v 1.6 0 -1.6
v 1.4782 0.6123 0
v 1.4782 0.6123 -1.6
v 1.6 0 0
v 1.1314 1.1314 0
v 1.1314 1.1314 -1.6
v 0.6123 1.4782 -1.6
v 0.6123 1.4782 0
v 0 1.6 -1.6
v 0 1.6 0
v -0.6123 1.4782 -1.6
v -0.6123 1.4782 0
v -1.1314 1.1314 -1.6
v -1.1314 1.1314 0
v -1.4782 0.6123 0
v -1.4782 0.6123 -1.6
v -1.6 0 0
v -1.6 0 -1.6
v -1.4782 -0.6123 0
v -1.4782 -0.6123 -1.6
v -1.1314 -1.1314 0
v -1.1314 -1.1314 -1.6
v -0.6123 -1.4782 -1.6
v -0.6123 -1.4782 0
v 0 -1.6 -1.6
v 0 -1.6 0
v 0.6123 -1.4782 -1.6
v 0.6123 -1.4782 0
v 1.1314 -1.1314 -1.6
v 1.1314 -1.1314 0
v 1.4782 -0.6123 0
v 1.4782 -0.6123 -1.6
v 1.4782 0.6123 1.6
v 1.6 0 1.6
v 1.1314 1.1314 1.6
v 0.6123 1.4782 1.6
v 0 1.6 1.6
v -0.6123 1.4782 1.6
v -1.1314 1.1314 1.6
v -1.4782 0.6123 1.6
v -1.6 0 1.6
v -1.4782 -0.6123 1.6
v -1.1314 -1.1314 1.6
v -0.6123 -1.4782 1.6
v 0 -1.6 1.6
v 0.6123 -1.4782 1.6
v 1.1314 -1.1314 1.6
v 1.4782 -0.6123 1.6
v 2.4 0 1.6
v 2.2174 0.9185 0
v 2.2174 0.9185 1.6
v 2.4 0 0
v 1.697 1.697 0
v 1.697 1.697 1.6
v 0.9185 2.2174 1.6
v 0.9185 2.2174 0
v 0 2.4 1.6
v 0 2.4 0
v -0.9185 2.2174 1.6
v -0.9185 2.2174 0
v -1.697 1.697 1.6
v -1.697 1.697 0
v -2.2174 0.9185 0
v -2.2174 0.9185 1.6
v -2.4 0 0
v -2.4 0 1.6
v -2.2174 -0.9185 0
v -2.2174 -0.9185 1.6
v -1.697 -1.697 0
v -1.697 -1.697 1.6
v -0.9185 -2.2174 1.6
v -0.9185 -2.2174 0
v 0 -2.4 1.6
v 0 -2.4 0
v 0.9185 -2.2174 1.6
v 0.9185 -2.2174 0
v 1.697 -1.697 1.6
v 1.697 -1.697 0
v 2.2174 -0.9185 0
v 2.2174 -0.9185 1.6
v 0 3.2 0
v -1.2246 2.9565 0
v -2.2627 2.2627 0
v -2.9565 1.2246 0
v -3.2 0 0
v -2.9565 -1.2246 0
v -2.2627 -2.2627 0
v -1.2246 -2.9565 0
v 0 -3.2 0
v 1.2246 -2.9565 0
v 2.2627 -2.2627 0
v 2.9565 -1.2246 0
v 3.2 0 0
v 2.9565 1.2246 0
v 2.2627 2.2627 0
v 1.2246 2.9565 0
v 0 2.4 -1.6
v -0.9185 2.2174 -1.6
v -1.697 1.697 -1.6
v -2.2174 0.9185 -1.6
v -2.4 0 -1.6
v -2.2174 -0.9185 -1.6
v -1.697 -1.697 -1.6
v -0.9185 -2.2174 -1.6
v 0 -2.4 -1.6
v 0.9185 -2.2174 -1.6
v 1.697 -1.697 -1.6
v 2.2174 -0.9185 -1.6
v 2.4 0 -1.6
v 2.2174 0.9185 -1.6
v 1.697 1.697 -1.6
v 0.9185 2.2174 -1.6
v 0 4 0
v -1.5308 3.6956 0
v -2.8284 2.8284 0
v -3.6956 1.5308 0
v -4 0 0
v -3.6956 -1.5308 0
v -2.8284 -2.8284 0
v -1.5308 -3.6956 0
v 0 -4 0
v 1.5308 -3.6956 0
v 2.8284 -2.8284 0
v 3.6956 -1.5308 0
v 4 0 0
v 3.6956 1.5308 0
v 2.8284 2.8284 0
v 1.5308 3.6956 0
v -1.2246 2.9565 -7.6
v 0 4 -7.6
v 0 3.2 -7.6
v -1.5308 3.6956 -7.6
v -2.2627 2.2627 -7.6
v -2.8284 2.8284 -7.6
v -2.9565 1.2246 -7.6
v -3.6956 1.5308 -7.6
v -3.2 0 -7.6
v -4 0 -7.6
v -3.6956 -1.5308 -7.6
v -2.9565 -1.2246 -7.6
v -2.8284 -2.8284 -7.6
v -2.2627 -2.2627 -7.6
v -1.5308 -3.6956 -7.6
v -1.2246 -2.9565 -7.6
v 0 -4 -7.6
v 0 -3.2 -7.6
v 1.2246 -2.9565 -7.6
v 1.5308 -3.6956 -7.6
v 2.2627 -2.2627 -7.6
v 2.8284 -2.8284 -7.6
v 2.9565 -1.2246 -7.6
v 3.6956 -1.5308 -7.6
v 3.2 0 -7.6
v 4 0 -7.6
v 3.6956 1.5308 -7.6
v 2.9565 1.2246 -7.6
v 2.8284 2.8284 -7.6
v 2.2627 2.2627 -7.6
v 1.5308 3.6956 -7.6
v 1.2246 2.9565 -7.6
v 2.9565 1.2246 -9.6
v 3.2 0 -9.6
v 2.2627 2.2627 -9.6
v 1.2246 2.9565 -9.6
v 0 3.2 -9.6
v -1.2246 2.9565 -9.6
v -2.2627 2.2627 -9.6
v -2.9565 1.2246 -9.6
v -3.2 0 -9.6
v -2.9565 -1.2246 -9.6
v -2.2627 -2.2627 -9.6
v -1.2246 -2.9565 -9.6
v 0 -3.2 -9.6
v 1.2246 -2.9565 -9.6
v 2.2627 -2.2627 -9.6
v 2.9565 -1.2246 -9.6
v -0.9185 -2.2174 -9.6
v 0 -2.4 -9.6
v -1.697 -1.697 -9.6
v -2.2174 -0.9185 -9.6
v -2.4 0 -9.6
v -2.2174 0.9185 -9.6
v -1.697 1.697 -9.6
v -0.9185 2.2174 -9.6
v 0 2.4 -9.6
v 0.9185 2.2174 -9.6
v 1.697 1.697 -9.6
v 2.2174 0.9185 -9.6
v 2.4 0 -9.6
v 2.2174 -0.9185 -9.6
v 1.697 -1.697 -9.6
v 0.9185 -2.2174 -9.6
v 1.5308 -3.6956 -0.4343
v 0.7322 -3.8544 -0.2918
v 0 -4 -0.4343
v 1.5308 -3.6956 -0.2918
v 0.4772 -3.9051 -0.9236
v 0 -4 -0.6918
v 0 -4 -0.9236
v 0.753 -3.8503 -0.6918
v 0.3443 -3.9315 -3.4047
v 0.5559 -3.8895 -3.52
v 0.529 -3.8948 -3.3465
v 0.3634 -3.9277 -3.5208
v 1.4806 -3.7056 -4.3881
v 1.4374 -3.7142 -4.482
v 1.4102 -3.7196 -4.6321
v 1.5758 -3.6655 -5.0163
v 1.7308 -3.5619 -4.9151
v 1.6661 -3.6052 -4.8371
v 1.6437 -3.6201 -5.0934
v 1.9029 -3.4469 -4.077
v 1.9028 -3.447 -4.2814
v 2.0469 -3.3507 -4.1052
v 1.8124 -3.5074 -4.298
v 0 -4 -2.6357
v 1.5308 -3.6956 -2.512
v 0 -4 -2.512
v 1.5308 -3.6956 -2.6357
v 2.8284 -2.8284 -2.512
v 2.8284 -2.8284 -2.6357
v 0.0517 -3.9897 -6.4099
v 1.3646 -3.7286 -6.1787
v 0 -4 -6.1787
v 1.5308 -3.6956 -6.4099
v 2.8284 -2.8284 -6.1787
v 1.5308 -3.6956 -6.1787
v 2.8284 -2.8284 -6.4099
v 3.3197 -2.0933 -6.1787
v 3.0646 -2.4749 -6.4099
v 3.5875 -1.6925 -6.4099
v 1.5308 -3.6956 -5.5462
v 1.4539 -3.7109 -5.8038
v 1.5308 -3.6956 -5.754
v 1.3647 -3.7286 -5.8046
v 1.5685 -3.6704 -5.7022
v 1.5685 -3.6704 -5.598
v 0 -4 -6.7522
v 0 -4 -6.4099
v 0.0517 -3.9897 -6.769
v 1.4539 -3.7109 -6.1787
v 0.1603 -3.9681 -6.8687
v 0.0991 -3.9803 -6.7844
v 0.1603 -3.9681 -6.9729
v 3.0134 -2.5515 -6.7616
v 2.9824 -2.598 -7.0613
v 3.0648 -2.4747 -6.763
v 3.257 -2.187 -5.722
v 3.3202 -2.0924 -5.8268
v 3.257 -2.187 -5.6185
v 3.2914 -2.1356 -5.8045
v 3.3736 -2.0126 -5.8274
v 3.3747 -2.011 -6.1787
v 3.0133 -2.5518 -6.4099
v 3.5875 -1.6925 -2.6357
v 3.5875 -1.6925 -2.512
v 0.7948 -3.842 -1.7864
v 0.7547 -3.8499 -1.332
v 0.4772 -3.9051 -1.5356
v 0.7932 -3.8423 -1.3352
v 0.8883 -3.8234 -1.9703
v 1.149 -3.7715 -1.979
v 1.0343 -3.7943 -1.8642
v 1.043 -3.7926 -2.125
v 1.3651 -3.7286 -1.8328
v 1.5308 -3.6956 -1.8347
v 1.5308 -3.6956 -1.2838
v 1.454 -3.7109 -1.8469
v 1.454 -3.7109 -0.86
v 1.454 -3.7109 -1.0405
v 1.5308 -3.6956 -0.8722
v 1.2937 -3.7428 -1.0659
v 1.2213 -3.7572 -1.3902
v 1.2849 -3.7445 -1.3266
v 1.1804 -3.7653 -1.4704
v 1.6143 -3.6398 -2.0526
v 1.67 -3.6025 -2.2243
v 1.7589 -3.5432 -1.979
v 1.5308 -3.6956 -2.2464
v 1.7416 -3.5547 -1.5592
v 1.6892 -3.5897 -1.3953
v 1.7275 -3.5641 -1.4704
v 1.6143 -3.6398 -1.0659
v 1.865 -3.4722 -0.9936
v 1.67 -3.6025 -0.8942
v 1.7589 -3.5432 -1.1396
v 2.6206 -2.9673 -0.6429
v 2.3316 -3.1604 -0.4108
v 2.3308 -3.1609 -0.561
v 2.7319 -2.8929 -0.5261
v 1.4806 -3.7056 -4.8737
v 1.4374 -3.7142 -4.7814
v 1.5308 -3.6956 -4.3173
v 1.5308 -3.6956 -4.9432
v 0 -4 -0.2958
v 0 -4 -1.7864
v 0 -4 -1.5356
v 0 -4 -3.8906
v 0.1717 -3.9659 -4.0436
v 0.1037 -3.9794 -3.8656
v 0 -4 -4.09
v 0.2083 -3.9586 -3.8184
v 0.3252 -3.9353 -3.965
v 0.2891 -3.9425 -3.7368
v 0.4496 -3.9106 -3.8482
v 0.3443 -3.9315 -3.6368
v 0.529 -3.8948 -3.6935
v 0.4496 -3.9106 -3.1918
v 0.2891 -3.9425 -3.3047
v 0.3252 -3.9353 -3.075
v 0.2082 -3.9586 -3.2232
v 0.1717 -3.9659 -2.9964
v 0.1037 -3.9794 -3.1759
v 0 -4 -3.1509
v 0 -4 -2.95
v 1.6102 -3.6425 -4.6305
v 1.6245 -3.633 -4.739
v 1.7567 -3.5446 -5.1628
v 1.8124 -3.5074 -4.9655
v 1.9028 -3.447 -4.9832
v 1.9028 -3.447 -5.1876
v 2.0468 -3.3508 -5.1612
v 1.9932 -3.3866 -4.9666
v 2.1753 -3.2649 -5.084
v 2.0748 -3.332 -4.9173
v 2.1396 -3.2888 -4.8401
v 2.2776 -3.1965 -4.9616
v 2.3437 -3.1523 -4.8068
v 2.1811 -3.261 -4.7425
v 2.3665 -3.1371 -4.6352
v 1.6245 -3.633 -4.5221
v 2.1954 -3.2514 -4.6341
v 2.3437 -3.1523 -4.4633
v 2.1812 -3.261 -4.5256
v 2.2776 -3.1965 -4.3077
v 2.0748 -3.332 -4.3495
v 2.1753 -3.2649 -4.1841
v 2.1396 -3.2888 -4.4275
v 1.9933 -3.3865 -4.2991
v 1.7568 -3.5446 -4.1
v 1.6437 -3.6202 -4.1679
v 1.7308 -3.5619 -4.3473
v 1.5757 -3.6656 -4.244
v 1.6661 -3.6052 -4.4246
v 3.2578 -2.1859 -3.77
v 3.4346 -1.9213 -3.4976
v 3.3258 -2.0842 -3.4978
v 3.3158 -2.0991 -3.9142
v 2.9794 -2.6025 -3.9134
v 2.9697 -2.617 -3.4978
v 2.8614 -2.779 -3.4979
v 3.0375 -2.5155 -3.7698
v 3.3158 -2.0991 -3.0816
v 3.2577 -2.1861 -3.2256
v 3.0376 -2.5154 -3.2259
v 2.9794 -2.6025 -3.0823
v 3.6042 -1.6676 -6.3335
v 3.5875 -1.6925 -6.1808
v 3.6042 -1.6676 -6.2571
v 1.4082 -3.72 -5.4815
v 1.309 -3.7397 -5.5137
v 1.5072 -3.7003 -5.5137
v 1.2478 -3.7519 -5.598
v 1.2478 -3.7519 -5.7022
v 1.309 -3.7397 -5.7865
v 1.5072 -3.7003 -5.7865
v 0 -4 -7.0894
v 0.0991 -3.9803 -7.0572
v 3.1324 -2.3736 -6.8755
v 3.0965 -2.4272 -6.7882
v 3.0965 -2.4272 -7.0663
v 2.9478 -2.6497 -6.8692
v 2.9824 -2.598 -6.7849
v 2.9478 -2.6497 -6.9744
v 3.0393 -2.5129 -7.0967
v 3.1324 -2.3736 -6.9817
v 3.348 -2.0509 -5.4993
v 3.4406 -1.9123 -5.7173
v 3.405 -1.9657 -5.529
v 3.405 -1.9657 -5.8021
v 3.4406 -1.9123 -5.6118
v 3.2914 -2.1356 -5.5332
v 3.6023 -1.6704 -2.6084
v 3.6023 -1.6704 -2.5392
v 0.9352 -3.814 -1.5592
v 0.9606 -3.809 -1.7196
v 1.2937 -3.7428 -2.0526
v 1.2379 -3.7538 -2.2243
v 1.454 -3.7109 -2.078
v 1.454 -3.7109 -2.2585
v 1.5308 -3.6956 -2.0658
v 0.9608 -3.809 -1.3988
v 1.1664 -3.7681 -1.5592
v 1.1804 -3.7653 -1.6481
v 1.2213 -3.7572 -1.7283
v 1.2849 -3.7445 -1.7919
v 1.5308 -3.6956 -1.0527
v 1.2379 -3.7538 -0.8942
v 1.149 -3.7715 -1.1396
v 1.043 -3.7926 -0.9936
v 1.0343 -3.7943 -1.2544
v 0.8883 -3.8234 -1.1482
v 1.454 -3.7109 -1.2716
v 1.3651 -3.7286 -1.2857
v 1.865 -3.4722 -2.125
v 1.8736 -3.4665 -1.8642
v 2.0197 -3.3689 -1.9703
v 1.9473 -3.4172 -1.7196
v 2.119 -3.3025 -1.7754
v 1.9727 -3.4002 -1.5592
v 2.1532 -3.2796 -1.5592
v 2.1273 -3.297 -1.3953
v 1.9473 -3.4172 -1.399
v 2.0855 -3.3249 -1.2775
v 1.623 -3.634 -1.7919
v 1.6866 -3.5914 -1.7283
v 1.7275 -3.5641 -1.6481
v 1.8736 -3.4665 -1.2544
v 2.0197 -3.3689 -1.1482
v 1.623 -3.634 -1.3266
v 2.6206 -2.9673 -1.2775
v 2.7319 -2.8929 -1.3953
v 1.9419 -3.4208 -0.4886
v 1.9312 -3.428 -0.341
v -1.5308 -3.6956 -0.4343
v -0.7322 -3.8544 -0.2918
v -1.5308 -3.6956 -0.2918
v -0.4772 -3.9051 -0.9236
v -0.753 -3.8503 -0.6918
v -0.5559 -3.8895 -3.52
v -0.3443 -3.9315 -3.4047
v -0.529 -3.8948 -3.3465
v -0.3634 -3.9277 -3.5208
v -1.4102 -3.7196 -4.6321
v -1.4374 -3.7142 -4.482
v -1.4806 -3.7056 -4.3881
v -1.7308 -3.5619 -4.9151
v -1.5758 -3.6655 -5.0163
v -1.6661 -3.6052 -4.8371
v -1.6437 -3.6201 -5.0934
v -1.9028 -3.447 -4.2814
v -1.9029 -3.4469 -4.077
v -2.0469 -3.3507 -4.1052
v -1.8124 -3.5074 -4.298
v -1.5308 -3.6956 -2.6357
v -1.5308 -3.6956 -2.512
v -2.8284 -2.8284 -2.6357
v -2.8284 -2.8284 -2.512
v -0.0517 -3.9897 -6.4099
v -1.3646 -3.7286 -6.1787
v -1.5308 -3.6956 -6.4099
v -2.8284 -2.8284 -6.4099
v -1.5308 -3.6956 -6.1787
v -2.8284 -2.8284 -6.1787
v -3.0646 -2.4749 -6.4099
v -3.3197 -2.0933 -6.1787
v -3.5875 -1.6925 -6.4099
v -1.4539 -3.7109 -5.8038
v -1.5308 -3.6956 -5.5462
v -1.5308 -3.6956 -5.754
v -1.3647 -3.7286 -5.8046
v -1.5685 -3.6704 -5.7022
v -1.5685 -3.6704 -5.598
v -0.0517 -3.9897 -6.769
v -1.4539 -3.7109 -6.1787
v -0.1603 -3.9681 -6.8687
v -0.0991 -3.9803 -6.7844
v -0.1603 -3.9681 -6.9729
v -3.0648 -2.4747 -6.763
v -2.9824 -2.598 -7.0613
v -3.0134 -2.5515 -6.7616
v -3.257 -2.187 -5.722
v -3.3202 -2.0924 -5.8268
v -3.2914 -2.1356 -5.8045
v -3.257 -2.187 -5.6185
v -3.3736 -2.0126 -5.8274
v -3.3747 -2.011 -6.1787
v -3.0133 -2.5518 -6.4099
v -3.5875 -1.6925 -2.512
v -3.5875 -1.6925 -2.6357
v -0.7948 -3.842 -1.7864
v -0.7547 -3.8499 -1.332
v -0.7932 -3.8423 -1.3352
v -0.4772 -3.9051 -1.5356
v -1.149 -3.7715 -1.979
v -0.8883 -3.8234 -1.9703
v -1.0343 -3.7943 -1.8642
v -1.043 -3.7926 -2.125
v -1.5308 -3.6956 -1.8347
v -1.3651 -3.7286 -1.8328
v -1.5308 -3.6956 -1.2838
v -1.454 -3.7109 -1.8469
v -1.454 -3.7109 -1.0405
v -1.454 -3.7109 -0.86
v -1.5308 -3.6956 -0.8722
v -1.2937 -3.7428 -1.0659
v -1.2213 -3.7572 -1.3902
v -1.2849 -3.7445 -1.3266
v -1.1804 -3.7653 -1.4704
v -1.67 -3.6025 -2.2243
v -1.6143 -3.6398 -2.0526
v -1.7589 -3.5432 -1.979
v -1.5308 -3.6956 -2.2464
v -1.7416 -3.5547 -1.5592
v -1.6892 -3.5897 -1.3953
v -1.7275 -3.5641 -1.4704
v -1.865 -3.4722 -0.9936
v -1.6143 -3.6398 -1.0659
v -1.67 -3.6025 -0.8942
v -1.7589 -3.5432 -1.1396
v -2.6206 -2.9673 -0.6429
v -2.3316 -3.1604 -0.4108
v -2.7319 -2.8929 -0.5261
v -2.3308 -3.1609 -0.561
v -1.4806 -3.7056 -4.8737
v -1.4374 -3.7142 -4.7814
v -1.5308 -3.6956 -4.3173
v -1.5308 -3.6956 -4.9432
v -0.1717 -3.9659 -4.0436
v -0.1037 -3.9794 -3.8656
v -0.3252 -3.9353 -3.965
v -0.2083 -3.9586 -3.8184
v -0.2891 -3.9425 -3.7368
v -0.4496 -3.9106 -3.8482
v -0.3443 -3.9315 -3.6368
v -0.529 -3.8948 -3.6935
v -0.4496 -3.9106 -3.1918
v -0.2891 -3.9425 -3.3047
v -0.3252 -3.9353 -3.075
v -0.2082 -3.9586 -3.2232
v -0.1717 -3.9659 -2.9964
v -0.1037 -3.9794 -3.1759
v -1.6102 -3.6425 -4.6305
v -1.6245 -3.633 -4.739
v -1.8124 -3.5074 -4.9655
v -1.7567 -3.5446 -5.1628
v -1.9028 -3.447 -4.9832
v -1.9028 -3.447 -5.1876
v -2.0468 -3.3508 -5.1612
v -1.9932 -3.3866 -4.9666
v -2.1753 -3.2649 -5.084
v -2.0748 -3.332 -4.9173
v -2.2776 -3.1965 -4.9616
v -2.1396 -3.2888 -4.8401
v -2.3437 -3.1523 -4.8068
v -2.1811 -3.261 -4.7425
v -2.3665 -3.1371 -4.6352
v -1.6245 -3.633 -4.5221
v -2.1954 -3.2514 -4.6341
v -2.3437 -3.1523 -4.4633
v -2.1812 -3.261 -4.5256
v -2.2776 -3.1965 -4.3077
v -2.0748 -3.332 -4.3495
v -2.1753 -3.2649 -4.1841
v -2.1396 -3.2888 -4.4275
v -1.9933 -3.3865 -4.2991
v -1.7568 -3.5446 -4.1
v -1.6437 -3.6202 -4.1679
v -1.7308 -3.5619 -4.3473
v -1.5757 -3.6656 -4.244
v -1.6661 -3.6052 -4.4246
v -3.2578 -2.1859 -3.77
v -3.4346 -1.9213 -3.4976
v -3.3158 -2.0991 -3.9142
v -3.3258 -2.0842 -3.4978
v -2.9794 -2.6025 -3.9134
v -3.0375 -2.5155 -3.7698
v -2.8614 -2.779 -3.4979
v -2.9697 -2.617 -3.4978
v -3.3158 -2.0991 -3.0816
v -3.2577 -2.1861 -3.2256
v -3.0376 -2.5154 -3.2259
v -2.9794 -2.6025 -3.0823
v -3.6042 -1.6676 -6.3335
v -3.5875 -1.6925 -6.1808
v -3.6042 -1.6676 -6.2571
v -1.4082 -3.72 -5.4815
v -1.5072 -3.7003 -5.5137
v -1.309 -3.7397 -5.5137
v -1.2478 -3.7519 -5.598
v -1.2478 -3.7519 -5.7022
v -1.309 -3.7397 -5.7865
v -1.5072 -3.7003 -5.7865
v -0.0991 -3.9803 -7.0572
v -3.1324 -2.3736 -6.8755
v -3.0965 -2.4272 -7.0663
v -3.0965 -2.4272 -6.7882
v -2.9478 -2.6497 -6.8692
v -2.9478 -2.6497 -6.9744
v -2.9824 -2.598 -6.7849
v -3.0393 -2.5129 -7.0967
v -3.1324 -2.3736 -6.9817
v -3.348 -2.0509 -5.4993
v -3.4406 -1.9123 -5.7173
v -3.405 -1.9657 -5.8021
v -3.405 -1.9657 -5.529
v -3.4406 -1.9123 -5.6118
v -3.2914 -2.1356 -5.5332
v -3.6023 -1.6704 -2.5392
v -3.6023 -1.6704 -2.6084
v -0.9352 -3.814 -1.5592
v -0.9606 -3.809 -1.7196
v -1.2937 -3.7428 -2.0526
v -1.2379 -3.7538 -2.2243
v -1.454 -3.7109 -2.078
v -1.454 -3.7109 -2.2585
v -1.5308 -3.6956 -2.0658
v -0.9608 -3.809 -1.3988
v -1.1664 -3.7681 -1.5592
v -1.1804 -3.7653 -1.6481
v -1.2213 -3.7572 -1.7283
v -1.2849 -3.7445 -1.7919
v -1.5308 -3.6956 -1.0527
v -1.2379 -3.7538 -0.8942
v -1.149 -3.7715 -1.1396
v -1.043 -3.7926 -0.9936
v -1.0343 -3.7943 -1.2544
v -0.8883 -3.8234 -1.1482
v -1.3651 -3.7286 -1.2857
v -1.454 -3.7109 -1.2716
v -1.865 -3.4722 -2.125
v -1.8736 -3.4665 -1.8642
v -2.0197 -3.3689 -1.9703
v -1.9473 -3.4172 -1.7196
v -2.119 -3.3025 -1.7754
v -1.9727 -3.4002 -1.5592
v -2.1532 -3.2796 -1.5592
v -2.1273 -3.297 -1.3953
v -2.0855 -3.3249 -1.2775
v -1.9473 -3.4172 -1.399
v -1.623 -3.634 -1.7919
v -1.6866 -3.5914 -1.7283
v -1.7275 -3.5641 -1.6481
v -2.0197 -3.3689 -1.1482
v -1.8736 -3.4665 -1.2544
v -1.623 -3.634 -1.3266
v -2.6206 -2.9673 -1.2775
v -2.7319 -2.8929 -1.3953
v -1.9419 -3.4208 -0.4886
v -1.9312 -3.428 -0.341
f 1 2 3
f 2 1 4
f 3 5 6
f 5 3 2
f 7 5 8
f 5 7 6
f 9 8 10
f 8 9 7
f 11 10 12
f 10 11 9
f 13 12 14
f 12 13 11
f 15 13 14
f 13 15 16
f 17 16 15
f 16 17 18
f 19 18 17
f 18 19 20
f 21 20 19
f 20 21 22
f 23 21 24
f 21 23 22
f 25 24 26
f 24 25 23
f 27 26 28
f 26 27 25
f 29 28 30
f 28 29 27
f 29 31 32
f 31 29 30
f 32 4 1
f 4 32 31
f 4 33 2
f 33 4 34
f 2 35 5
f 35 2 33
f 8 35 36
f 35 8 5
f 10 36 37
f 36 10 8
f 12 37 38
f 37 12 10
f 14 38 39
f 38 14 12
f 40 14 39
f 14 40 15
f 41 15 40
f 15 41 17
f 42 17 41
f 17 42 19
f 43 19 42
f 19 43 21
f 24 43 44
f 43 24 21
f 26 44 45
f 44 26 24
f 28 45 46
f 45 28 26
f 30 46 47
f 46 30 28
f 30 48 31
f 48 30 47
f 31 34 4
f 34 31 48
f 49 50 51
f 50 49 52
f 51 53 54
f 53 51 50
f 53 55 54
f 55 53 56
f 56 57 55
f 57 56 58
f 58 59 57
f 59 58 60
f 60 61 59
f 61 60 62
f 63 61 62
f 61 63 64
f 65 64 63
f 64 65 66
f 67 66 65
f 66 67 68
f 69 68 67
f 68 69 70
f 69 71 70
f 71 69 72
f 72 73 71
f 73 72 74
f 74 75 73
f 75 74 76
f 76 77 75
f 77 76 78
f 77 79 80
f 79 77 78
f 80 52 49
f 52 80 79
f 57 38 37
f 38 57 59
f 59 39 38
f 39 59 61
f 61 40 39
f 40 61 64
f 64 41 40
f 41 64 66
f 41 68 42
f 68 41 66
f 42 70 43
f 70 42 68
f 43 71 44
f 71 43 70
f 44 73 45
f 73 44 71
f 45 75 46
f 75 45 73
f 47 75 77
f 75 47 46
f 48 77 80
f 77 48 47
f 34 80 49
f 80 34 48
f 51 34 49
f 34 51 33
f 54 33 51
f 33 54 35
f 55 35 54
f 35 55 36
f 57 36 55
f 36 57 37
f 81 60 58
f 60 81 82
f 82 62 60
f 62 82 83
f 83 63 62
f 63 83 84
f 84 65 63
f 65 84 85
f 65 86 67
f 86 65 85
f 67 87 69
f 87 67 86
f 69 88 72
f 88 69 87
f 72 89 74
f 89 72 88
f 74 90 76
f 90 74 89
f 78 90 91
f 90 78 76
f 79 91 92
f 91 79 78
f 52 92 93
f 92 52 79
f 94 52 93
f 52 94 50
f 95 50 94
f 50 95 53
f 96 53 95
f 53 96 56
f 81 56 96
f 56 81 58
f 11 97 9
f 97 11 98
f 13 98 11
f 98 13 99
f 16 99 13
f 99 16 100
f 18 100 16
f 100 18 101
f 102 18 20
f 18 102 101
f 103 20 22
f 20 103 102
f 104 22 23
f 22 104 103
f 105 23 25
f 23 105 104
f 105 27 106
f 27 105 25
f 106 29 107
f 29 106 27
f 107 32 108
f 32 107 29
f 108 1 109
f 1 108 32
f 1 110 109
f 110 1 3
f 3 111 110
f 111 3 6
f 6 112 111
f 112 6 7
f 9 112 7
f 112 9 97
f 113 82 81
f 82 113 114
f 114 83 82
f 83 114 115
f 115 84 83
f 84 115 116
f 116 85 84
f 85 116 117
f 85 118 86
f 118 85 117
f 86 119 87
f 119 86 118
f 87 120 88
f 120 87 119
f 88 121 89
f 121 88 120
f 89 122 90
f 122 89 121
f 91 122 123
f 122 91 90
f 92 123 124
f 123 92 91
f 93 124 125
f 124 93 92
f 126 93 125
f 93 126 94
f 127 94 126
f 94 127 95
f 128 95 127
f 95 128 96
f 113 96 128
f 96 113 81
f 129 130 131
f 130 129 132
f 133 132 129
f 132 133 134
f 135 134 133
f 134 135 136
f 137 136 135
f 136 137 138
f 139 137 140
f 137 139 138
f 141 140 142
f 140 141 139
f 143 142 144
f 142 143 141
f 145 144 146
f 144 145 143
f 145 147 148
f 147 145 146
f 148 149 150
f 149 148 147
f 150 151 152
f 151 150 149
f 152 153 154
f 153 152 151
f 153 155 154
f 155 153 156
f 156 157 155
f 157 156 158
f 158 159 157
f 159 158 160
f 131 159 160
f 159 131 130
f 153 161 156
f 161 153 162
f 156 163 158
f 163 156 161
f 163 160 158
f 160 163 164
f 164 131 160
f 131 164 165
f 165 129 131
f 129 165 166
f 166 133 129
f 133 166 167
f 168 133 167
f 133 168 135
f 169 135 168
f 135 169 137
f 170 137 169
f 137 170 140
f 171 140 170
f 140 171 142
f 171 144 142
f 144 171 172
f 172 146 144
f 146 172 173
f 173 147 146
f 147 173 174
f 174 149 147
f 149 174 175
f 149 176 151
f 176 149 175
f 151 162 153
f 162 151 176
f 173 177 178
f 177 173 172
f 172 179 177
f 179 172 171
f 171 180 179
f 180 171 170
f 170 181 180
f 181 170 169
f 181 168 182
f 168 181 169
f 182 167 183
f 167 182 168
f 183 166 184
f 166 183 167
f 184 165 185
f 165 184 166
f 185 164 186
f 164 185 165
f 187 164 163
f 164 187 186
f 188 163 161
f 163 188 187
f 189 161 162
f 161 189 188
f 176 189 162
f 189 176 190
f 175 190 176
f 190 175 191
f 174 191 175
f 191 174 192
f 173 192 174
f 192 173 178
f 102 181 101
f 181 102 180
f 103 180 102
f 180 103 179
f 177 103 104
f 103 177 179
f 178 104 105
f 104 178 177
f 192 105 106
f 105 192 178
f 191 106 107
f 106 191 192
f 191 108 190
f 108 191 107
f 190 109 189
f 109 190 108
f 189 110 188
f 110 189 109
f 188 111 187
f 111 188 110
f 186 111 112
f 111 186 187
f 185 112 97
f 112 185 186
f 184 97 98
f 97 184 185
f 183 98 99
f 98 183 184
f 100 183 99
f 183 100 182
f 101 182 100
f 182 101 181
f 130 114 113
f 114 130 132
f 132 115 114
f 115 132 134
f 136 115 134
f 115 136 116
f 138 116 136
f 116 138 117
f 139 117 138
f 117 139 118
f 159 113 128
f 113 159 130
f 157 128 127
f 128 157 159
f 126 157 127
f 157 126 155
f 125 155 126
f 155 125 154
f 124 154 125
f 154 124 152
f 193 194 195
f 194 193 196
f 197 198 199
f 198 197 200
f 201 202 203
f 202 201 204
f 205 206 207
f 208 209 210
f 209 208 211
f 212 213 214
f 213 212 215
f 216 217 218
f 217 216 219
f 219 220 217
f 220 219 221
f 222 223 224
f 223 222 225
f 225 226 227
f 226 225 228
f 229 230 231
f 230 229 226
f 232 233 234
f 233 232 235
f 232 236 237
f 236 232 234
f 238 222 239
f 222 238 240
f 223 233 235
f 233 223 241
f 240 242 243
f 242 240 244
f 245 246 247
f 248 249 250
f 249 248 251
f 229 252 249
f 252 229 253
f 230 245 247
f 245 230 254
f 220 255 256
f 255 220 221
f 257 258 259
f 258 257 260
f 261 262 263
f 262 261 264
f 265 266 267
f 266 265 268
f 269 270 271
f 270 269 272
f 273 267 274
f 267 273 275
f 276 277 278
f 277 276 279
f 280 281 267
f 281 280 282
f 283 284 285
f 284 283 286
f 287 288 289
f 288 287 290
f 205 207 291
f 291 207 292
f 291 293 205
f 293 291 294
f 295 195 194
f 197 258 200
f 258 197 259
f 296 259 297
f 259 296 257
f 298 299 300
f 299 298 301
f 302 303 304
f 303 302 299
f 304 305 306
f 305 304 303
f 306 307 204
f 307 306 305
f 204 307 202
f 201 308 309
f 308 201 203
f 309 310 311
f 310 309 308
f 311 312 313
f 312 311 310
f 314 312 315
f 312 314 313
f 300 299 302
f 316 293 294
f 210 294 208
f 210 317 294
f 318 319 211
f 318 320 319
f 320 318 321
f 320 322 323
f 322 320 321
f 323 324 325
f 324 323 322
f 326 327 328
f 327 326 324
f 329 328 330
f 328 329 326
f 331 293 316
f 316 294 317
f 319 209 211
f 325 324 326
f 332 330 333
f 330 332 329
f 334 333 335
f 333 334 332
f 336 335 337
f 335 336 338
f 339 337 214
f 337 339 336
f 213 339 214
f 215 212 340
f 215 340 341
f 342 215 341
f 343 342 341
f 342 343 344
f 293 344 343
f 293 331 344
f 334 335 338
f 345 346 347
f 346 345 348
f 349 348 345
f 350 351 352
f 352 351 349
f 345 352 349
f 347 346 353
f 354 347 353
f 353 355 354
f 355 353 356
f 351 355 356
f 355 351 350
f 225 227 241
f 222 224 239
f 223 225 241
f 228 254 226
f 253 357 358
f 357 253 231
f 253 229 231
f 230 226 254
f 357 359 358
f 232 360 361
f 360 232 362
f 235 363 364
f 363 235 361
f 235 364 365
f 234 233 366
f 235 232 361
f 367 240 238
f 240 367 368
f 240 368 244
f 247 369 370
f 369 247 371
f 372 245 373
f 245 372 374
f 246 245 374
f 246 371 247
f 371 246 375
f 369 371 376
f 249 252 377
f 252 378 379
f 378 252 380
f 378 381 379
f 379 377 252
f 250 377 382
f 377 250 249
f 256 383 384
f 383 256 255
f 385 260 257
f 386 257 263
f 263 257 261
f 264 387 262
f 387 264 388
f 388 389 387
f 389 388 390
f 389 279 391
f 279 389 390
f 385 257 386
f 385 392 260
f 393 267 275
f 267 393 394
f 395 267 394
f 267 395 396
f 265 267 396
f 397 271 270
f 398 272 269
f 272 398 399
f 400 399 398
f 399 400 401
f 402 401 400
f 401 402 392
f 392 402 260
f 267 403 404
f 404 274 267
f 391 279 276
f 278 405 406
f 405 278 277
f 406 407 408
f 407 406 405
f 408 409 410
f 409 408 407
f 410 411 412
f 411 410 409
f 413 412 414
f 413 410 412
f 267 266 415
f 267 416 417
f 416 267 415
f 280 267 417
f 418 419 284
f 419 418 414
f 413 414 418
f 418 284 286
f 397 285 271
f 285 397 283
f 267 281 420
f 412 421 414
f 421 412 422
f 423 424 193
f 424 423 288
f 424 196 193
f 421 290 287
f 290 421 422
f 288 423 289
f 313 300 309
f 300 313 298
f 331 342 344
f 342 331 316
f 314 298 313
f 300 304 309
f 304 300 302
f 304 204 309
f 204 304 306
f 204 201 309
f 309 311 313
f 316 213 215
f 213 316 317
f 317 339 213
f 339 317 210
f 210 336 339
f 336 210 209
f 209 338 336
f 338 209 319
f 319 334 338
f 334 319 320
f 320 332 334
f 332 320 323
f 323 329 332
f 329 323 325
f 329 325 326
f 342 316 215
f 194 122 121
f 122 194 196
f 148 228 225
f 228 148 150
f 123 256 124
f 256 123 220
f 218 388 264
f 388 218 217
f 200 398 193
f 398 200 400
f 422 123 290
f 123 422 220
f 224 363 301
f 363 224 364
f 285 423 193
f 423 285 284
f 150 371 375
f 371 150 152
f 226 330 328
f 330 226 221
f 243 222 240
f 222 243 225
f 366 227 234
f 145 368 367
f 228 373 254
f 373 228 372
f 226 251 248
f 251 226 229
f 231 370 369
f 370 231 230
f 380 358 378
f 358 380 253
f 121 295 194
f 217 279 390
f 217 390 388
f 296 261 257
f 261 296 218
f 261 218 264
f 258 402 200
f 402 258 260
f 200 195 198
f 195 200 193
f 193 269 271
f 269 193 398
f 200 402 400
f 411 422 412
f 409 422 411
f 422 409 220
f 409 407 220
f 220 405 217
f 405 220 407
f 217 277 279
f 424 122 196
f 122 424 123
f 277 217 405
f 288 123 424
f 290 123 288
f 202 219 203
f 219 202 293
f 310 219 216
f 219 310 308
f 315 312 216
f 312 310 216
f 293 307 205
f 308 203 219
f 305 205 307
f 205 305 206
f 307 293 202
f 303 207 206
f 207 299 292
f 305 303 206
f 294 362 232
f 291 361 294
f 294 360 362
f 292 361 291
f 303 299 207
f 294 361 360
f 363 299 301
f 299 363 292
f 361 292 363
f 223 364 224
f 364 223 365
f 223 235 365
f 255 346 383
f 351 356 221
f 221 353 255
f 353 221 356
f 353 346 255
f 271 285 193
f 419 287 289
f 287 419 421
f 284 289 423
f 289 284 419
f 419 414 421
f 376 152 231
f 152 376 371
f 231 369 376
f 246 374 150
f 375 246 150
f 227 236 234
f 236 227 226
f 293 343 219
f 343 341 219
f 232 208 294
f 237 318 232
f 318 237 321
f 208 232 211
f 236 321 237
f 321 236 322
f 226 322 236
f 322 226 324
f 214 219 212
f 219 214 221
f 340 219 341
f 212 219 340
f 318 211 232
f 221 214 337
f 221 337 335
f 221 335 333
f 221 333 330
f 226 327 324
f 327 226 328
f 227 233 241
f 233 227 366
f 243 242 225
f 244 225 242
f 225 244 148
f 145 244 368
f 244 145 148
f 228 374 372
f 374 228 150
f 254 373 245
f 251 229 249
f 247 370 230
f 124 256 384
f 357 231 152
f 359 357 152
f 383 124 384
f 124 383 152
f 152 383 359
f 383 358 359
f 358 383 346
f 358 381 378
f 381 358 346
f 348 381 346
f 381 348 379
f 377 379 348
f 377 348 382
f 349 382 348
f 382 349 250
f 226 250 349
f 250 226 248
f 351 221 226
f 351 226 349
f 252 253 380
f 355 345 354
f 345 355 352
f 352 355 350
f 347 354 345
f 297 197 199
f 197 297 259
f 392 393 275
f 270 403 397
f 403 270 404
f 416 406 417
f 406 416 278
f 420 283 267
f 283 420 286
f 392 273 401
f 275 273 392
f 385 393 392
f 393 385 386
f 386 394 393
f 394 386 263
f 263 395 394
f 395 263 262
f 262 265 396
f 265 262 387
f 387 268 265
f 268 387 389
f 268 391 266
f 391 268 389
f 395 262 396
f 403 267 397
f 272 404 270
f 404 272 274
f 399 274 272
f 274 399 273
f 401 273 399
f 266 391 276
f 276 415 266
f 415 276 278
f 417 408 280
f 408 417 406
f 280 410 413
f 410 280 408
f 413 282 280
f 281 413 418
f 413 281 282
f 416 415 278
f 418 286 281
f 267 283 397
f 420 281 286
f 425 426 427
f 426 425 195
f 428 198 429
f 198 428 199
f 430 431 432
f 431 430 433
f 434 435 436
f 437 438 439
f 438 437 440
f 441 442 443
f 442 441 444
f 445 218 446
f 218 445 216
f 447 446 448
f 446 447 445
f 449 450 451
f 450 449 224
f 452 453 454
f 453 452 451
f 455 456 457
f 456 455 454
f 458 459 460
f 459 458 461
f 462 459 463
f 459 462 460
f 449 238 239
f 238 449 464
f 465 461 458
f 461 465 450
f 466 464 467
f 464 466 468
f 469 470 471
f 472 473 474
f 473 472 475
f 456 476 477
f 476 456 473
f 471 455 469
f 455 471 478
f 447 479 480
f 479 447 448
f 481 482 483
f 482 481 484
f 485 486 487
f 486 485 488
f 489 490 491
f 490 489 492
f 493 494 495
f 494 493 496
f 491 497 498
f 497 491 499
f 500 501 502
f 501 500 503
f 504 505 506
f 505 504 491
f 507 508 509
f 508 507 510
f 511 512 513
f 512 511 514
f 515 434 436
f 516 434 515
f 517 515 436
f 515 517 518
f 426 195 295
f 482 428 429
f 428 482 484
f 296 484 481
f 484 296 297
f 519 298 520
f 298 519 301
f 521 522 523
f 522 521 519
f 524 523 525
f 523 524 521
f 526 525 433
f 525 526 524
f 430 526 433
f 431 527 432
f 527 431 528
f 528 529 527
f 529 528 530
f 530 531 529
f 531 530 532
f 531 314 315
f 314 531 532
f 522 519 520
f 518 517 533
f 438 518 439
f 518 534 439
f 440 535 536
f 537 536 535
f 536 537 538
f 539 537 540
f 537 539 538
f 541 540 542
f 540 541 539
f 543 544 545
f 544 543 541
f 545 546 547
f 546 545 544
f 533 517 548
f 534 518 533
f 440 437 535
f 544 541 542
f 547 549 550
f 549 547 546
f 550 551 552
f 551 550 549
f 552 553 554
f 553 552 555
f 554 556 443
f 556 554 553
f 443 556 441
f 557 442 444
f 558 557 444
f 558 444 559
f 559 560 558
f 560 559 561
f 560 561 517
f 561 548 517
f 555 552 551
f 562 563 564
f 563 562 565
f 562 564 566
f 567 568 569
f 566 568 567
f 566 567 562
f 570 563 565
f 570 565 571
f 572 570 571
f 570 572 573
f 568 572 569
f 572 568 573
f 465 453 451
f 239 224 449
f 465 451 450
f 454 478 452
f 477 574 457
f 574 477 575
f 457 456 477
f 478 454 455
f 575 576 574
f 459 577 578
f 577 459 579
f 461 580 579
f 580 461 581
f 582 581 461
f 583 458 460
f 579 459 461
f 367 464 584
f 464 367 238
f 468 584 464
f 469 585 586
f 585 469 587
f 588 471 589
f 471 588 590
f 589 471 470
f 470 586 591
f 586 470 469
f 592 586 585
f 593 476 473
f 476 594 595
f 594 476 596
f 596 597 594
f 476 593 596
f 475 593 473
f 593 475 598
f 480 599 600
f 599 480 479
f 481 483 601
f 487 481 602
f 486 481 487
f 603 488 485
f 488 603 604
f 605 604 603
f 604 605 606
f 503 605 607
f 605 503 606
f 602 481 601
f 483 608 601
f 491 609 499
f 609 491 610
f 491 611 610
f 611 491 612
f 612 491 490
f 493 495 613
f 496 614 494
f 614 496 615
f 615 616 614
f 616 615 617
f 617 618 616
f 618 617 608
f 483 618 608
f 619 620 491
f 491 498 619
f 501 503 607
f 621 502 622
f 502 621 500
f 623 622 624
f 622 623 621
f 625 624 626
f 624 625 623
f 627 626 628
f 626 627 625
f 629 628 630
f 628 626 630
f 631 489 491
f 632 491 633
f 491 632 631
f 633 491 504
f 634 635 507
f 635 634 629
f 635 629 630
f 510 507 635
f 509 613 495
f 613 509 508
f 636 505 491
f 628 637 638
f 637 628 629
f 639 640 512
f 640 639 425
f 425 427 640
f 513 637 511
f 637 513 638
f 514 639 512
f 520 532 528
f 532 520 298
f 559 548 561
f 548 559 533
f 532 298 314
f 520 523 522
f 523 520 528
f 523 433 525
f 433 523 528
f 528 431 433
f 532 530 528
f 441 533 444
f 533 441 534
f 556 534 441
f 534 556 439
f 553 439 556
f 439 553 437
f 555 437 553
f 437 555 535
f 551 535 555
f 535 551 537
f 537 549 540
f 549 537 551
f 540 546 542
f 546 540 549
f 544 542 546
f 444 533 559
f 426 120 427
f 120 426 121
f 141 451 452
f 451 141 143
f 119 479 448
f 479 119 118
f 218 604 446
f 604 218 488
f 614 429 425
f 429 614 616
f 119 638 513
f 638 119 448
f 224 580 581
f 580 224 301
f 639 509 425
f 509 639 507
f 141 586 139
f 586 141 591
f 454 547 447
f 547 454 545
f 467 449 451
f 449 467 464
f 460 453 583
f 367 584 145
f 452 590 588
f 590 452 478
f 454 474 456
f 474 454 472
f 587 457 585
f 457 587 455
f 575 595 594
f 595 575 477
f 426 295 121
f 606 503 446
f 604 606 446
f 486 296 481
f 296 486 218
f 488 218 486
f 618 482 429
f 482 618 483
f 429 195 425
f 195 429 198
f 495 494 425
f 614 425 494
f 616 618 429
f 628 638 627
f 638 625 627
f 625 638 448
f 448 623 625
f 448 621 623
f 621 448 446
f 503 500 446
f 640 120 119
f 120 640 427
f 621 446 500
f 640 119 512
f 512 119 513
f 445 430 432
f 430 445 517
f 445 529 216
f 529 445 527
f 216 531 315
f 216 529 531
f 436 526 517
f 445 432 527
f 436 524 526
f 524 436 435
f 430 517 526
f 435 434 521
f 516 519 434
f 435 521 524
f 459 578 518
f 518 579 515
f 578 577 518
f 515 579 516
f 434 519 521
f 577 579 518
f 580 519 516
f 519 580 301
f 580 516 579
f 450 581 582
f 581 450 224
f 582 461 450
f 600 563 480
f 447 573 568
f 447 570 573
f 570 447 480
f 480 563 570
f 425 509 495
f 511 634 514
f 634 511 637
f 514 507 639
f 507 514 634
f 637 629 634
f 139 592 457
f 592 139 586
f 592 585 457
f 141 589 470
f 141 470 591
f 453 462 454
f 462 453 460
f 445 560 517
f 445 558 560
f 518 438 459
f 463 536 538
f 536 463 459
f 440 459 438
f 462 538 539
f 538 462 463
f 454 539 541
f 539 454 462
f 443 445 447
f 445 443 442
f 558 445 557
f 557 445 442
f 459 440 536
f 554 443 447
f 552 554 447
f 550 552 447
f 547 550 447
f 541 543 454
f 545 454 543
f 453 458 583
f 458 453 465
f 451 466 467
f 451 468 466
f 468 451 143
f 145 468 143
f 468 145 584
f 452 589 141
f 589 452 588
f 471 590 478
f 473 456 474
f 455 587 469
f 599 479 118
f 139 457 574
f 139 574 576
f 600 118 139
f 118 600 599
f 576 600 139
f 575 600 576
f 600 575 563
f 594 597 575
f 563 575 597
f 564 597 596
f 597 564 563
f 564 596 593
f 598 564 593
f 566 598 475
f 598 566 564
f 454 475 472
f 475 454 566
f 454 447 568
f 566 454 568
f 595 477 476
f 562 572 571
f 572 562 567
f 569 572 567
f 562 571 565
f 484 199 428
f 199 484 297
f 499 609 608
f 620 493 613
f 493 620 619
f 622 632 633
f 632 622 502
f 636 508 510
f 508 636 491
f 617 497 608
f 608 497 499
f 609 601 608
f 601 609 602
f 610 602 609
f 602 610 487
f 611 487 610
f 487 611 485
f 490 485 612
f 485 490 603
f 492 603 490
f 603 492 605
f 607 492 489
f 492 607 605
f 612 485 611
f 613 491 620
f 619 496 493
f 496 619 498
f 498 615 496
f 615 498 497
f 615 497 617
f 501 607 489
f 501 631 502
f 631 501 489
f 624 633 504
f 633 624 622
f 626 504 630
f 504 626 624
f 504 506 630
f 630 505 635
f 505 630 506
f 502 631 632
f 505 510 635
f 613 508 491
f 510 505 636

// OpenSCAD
use <../lib.scad>
use <../p/5-16cyli.scad>
use <s/3062bp03s01.scad>
use <s/3062bs01.scad>
function ldraw_lib__3062bp03() = [
// 0 Brick  1 x  1 Round with Droid Pattern
// 0 Name: 3062bp03.dat
// 0 Author: Fredrik Hareide [fhareide]
// 0 !LDRAW_ORG Part UPDATE 2025-06
// 0 !LICENSE Licensed under CC BY 4.0 : see CAreadme.txt
// 
// 0 BFC CERTIFY CCW
  [0,"BFC","CERTIFY"],
  [0,"BFC","CCW"],
// 
// 0 !KEYWORDS BrickLink 3062pb067, IG 88, Rebrickable 3062bpr0029, set 75292
// 0 !KEYWORDS Set 75307, Star Wars
// 
// 0 !HISTORY 2025-06-26 [OrionP] Official Update 2025-06
// 
// 
// 1 16 0 0 0 1 0 0 0 1 0 0 0 1 s\3062bs01.dat
  [1,16,0,0,0,1,0,0,0,1,0,0,0,1, ldraw_lib__s__3062bs01()],
// 
// 1 16 0 0 0 0 0 -10 0 19 0 10 0 0 5-16cyli.dat
  [1,16,0,0,0,0,0,-10,0,19,0,10,0,0, ldraw_lib__5_16cyli()],
// 1 16 0 0 0 0 0 10 0 19 0 10 0 0 5-16cyli.dat
  [1,16,0,0,0,0,0,10,0,19,0,10,0,0, ldraw_lib__5_16cyli()],
// 
// 1 16 0 0 0 1 0 0 0 1 0 0 0 1 s\3062bp03s01.dat
  [1,16,0,0,0,1,0,0,0,1,0,0,0,1, ldraw_lib__s__3062bp03s01()],
// 1 16 0 0 0 -1 0 0 0 1 0 0 0 1 s\3062bp03s01.dat
  [1,16,0,0,0,-1,0,0,0,1,0,0,0,1, ldraw_lib__s__3062bp03s01()],
// 
// 5 24 0 19 -10 0 0 -10 -3.827 19 -9.239 3.827 19 -9.239
  [5,24,0,19,-10,0,0,-10,-3.827,19,-9.239,3.827,19,-9.239],
// 5 24 3.827 19 -9.239 3.827 0 -9.239 0 19 -10 7.071 19 -7.071
  [5,24,3.827,19,-9.239,3.827,0,-9.239,0,19,-10,7.071,19,-7.071],
// 5 24 7.071 19 -7.071 7.071 0 -7.071 3.827 19 -9.239 9.239 19 -3.827
  [5,24,7.071,19,-7.071,7.071,0,-7.071,3.827,19,-9.239,9.239,19,-3.827],
// 5 24 9.239 19 -3.827 9.239 0 -3.827 7.071 19 -7.071 10 19 0
  [5,24,9.239,19,-3.827,9.239,0,-3.827,7.071,19,-7.071,10,19,0],
// 5 24 -9.239 19 -3.827 -9.239 0 -3.827 -10 19 0 -7.071 19 -7.071
  [5,24,-9.239,19,-3.827,-9.239,0,-3.827,-10,19,0,-7.071,19,-7.071],
// 5 24 -7.071 19 -7.071 -7.071 0 -7.071 -9.239 19 -3.827 -3.827 19 -9.239
  [5,24,-7.071,19,-7.071,-7.071,0,-7.071,-9.239,19,-3.827,-3.827,19,-9.239],
// 5 24 -3.827 19 -9.239 -3.827 0 -9.239 -7.071 19 -7.071 0 19 -10
  [5,24,-3.827,19,-9.239,-3.827,0,-9.239,-7.071,19,-7.071,0,19,-10],
// 5 24 10 19 0 10 0 0 9.239 19 3.827 9.3265 8.2 -3.3868
  [5,24,10,19,0,10,0,0,9.239,19,3.827,9.3265,8.2,-3.3868],
// 5 24 -10 0 0 -10 19 0 -9.975 11.9 -0.126 -9.239 0 3.827
  [5,24,-10,0,0,-10,19,0,-9.975,11.9,-0.126,-9.239,0,3.827],
];
module ldraw_lib__3062bp03(step=0, col=false, unit=2/5, alt=false, line=0.2, solid=!$preview)
    makepoly(ldraw_lib__3062bp03(), step=step, col=col, unit=unit, alt=alt, line=line, solid=solid);
ldraw_lib__3062bp03(line=0.2);
